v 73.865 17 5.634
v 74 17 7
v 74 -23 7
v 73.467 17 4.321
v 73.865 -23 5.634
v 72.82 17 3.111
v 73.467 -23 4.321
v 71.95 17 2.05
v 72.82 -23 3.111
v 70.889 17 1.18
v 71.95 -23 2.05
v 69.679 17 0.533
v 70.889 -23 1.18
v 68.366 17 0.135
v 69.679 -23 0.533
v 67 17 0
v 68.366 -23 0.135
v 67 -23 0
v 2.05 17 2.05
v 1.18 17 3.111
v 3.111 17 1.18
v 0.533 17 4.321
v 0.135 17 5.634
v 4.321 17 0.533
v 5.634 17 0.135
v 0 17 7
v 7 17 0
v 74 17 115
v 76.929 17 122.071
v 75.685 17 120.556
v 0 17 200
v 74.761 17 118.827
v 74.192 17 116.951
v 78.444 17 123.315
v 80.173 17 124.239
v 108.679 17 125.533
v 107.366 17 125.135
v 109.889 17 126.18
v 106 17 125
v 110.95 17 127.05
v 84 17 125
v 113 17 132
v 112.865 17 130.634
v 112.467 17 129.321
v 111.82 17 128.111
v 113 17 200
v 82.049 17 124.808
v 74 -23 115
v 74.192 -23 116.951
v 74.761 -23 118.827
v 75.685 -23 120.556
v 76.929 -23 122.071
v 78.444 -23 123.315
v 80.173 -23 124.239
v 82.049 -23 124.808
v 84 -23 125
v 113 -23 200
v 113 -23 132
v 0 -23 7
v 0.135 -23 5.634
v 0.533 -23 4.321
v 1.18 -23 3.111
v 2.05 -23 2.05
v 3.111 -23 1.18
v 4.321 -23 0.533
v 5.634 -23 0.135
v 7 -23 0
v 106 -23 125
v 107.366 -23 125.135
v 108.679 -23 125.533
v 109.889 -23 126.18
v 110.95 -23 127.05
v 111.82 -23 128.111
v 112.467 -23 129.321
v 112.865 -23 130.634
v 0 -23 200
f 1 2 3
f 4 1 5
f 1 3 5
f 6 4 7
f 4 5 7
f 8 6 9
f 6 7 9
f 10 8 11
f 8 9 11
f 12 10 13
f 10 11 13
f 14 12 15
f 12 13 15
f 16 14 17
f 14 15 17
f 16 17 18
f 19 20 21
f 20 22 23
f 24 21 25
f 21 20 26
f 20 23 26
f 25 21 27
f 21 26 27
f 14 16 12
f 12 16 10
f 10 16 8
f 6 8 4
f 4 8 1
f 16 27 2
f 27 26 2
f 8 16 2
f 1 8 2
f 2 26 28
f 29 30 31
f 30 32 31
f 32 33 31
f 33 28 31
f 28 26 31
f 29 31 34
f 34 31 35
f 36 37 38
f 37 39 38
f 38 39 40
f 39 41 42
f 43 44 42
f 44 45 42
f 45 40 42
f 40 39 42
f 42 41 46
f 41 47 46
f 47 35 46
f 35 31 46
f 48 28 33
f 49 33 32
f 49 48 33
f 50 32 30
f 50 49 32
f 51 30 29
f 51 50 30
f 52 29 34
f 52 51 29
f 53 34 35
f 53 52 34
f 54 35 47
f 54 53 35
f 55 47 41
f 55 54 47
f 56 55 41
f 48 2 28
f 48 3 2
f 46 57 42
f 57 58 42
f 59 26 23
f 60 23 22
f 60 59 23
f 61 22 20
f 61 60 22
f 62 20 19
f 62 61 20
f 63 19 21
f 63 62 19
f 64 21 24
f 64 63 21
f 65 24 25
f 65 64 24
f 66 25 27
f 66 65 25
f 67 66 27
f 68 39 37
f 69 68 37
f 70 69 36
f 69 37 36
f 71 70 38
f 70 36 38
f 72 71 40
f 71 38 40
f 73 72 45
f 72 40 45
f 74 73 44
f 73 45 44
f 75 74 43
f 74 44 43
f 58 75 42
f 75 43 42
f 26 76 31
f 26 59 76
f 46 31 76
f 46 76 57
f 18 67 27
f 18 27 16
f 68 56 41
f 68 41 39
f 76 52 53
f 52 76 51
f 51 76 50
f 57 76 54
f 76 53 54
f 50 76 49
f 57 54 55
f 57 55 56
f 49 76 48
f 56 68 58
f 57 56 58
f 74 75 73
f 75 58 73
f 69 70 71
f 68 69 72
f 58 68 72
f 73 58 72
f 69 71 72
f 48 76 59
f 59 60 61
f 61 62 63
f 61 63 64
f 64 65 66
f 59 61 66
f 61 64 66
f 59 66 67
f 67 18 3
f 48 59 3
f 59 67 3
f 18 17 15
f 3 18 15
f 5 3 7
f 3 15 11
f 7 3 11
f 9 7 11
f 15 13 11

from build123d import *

# Parameters (mm, degrees)
F1_DEPTH = 23
F2_W     = 113
F2_H     = 46
F3_DEPTH = 40
F4_R     = 7
F5_R     = 10
F6_W     = 113
F6_H     = 6
F7_DEPTH = 200.001


with BuildPart() as f1:
    # F0 (on Front) → F1 (new body, symmetric)
    with BuildSketch(Plane.XZ):
        Polygon((0, 160), (0, 0), (74, 0), (74, 125), (113, 125), (113, 160), align=None)
    extrude(amount=F1_DEPTH, both=True)

    # F2 (on face) → F3 (join)
    with BuildSketch(Plane.XY.offset(160)):
        with Locations((56.5, 0)):
            Rectangle(F2_W, F2_H)
    extrude(amount=F3_DEPTH)

    # F4
    f4_edges = [f1.edges().sort_by_distance(p)[0] for p in [
        (74, 0, 0),
        (0, 0, 0),
        (113, 0, 125),
    ]]
    fillet(f4_edges, radius=F4_R)

    # F5
    f5_edges = [f1.edges().sort_by_distance(p)[0] for p in [
        (74, 0, 125),
    ]]
    fillet(f5_edges, radius=F5_R)

    # F6 (on face) → F7 (cut, through all)
    with BuildSketch(Plane.XY.offset(200)):
        with Locations((56.5, 20)):
            Rectangle(F6_W, F6_H)
    extrude(amount=-F7_DEPTH, mode=Mode.SUBTRACT)


solid = f1.part
